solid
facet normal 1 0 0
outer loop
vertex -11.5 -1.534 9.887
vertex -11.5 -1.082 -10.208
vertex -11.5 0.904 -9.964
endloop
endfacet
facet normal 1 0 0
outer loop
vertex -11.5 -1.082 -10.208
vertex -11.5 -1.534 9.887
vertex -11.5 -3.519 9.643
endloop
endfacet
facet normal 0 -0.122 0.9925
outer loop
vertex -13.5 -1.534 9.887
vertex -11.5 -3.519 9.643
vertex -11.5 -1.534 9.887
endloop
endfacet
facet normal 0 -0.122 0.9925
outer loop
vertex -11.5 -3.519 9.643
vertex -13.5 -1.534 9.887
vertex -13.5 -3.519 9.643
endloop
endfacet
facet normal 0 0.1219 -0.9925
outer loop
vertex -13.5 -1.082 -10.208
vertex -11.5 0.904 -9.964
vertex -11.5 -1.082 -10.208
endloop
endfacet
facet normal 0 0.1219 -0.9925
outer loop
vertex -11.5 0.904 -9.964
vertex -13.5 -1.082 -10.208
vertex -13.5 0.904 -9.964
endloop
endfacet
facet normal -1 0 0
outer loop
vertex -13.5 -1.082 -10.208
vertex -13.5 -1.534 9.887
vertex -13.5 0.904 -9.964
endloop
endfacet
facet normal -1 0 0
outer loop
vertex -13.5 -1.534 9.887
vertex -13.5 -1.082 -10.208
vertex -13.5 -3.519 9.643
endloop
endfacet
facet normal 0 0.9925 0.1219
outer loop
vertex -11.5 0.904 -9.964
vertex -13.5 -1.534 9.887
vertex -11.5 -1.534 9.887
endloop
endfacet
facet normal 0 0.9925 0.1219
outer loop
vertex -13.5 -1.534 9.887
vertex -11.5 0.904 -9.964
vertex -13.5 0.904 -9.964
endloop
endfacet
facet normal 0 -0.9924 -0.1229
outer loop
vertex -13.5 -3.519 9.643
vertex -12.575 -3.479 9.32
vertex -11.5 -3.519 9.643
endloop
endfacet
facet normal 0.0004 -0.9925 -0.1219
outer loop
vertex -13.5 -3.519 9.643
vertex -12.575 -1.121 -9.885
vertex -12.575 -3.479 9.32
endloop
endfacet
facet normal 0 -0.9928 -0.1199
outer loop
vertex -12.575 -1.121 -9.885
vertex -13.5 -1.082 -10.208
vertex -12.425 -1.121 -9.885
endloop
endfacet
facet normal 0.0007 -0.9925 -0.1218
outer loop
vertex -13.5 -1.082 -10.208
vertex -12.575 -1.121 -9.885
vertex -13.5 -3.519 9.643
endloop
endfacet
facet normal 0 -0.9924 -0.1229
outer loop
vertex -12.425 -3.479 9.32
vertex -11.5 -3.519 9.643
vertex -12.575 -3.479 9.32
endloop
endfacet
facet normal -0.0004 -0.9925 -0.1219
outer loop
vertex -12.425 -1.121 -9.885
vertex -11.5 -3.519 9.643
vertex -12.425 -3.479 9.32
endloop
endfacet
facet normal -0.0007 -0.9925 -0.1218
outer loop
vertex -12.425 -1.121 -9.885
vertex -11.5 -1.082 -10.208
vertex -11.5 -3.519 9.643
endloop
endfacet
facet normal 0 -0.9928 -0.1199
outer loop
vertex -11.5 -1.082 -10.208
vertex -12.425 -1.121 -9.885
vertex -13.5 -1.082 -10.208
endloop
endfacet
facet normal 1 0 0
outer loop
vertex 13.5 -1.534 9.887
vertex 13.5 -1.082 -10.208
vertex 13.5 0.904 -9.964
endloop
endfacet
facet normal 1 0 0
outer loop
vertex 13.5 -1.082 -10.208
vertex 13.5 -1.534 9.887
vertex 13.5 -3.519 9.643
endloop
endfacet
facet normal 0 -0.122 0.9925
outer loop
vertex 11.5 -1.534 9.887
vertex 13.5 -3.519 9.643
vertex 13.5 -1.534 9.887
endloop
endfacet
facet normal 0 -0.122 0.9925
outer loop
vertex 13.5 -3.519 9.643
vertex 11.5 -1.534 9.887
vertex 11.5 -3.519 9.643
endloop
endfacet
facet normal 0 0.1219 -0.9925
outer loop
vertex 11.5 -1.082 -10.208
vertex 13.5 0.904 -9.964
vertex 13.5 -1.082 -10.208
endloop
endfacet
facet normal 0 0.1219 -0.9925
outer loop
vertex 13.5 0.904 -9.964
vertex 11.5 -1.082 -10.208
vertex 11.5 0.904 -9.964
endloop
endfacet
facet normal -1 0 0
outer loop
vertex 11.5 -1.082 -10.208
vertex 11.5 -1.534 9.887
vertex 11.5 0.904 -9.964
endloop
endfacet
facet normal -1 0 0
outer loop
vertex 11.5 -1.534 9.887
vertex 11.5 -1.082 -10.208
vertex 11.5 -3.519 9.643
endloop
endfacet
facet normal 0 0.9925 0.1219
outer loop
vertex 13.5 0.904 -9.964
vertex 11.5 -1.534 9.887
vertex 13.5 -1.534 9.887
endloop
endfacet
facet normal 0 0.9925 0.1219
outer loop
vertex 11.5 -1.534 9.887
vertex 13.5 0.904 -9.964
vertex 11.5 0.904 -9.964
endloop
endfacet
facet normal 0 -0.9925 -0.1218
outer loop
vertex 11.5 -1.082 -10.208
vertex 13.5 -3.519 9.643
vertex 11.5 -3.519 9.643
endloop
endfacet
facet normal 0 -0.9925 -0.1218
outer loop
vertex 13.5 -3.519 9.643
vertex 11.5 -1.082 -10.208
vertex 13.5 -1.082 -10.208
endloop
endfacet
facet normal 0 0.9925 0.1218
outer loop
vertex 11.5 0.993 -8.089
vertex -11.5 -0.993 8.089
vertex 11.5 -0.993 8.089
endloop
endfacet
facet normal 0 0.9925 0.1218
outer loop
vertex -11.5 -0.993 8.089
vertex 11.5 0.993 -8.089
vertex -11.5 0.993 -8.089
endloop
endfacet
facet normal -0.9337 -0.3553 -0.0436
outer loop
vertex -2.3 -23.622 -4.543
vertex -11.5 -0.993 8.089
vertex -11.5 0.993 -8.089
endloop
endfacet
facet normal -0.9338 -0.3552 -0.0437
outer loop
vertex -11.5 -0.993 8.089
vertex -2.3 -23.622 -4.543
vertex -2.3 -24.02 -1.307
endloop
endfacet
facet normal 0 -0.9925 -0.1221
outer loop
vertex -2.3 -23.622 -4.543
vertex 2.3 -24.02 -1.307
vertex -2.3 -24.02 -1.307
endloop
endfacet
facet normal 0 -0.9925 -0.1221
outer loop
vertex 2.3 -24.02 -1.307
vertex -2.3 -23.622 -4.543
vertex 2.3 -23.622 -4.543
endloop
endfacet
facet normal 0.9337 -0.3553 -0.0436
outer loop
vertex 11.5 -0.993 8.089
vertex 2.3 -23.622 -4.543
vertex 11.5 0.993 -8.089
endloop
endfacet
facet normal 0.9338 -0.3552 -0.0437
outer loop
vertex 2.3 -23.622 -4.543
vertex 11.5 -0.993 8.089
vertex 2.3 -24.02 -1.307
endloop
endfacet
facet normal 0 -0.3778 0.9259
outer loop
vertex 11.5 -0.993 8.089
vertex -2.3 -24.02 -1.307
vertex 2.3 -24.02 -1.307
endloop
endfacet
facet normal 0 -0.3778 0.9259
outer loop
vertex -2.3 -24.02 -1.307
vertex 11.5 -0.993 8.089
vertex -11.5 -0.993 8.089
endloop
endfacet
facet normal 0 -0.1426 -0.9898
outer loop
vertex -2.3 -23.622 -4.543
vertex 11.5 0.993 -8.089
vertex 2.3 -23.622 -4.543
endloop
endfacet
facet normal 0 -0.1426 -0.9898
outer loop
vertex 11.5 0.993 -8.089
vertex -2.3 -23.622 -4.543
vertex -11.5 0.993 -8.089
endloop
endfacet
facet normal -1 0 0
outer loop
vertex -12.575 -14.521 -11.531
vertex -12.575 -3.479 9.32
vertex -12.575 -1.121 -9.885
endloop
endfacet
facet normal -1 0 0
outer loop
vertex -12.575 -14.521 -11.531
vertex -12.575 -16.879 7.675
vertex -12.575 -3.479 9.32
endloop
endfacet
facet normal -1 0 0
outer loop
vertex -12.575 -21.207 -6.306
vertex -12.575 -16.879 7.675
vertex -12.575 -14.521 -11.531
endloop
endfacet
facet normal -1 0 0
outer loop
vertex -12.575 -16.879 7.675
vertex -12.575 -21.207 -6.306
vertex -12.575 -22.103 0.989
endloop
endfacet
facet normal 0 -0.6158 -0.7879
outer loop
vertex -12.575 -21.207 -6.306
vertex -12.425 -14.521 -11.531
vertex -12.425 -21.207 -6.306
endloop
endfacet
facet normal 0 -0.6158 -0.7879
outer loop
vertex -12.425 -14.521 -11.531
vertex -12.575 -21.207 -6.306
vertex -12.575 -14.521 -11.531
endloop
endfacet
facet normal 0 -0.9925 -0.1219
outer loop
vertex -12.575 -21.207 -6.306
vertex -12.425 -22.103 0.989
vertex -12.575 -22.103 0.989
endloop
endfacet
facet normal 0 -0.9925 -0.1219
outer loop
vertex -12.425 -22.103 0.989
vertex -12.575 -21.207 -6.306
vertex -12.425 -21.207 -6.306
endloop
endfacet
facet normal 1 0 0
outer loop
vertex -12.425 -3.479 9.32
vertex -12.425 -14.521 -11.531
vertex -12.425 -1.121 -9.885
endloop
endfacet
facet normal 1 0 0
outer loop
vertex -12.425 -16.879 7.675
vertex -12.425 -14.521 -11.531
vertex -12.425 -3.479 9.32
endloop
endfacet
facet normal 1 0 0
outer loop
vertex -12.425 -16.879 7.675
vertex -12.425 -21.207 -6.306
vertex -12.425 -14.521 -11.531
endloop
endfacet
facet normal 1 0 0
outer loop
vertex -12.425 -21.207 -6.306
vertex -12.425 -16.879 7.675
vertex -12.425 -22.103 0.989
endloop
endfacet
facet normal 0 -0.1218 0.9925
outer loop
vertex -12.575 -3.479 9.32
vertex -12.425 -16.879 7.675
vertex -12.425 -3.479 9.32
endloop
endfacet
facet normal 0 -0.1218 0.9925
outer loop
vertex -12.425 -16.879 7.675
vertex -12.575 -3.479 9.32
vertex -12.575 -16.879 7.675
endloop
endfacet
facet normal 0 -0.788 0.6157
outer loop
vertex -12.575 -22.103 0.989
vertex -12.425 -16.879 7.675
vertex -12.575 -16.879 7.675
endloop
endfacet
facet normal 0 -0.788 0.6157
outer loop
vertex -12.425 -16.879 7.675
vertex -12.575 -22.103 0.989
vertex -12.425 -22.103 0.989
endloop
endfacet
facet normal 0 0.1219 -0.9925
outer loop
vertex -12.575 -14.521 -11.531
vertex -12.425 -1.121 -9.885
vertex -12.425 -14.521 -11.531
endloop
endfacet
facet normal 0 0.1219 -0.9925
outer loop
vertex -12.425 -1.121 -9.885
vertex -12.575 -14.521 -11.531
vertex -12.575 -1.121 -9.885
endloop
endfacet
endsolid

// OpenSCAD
sweep_angle = 7;

bracket_th = 0.3175;

module board() {
    color("blue") {
        h = 19.35;
        d = 19.5;
        cut = 6;
        board_width=0.15;
        rotate(90,[0,1,0]) rotate(-90,[0,0,1])
        linear_extrude(height=board_width, center=true) {
            polygon( [ [0,-h/2], [d-cut, -h/2], [d, -h/2 + cut],
                [d, h/2 - cut], [d-cut, h/2], [0, h/2] ] );
        }
    }
}
                    
module CRT() {
    CRT_depth = 24;
    CRT_width = 23;
    CRT_height = 16.3;
    upright_height = 20;
    rotate(90,[1,0,0])
    color("green") {
        linear_extrude(height=CRT_depth, scale=0.2) {
            square([CRT_width,CRT_height],center=true);
        }
    }
    color("gray") {
        
        translate([0,-1-bracket_th,0]) {
            translate([-1-(CRT_width/2),0,0])
            cube([2,2,upright_height],center=true);
            translate([1+(CRT_width/2),0,0])
            cube([2,2,upright_height],center=true);
        }
    }
    translate([-1-(CRT_width/2),-2-bracket_th,0]) board();
}


rotate(sweep_angle, [1,0,0]) CRT();
